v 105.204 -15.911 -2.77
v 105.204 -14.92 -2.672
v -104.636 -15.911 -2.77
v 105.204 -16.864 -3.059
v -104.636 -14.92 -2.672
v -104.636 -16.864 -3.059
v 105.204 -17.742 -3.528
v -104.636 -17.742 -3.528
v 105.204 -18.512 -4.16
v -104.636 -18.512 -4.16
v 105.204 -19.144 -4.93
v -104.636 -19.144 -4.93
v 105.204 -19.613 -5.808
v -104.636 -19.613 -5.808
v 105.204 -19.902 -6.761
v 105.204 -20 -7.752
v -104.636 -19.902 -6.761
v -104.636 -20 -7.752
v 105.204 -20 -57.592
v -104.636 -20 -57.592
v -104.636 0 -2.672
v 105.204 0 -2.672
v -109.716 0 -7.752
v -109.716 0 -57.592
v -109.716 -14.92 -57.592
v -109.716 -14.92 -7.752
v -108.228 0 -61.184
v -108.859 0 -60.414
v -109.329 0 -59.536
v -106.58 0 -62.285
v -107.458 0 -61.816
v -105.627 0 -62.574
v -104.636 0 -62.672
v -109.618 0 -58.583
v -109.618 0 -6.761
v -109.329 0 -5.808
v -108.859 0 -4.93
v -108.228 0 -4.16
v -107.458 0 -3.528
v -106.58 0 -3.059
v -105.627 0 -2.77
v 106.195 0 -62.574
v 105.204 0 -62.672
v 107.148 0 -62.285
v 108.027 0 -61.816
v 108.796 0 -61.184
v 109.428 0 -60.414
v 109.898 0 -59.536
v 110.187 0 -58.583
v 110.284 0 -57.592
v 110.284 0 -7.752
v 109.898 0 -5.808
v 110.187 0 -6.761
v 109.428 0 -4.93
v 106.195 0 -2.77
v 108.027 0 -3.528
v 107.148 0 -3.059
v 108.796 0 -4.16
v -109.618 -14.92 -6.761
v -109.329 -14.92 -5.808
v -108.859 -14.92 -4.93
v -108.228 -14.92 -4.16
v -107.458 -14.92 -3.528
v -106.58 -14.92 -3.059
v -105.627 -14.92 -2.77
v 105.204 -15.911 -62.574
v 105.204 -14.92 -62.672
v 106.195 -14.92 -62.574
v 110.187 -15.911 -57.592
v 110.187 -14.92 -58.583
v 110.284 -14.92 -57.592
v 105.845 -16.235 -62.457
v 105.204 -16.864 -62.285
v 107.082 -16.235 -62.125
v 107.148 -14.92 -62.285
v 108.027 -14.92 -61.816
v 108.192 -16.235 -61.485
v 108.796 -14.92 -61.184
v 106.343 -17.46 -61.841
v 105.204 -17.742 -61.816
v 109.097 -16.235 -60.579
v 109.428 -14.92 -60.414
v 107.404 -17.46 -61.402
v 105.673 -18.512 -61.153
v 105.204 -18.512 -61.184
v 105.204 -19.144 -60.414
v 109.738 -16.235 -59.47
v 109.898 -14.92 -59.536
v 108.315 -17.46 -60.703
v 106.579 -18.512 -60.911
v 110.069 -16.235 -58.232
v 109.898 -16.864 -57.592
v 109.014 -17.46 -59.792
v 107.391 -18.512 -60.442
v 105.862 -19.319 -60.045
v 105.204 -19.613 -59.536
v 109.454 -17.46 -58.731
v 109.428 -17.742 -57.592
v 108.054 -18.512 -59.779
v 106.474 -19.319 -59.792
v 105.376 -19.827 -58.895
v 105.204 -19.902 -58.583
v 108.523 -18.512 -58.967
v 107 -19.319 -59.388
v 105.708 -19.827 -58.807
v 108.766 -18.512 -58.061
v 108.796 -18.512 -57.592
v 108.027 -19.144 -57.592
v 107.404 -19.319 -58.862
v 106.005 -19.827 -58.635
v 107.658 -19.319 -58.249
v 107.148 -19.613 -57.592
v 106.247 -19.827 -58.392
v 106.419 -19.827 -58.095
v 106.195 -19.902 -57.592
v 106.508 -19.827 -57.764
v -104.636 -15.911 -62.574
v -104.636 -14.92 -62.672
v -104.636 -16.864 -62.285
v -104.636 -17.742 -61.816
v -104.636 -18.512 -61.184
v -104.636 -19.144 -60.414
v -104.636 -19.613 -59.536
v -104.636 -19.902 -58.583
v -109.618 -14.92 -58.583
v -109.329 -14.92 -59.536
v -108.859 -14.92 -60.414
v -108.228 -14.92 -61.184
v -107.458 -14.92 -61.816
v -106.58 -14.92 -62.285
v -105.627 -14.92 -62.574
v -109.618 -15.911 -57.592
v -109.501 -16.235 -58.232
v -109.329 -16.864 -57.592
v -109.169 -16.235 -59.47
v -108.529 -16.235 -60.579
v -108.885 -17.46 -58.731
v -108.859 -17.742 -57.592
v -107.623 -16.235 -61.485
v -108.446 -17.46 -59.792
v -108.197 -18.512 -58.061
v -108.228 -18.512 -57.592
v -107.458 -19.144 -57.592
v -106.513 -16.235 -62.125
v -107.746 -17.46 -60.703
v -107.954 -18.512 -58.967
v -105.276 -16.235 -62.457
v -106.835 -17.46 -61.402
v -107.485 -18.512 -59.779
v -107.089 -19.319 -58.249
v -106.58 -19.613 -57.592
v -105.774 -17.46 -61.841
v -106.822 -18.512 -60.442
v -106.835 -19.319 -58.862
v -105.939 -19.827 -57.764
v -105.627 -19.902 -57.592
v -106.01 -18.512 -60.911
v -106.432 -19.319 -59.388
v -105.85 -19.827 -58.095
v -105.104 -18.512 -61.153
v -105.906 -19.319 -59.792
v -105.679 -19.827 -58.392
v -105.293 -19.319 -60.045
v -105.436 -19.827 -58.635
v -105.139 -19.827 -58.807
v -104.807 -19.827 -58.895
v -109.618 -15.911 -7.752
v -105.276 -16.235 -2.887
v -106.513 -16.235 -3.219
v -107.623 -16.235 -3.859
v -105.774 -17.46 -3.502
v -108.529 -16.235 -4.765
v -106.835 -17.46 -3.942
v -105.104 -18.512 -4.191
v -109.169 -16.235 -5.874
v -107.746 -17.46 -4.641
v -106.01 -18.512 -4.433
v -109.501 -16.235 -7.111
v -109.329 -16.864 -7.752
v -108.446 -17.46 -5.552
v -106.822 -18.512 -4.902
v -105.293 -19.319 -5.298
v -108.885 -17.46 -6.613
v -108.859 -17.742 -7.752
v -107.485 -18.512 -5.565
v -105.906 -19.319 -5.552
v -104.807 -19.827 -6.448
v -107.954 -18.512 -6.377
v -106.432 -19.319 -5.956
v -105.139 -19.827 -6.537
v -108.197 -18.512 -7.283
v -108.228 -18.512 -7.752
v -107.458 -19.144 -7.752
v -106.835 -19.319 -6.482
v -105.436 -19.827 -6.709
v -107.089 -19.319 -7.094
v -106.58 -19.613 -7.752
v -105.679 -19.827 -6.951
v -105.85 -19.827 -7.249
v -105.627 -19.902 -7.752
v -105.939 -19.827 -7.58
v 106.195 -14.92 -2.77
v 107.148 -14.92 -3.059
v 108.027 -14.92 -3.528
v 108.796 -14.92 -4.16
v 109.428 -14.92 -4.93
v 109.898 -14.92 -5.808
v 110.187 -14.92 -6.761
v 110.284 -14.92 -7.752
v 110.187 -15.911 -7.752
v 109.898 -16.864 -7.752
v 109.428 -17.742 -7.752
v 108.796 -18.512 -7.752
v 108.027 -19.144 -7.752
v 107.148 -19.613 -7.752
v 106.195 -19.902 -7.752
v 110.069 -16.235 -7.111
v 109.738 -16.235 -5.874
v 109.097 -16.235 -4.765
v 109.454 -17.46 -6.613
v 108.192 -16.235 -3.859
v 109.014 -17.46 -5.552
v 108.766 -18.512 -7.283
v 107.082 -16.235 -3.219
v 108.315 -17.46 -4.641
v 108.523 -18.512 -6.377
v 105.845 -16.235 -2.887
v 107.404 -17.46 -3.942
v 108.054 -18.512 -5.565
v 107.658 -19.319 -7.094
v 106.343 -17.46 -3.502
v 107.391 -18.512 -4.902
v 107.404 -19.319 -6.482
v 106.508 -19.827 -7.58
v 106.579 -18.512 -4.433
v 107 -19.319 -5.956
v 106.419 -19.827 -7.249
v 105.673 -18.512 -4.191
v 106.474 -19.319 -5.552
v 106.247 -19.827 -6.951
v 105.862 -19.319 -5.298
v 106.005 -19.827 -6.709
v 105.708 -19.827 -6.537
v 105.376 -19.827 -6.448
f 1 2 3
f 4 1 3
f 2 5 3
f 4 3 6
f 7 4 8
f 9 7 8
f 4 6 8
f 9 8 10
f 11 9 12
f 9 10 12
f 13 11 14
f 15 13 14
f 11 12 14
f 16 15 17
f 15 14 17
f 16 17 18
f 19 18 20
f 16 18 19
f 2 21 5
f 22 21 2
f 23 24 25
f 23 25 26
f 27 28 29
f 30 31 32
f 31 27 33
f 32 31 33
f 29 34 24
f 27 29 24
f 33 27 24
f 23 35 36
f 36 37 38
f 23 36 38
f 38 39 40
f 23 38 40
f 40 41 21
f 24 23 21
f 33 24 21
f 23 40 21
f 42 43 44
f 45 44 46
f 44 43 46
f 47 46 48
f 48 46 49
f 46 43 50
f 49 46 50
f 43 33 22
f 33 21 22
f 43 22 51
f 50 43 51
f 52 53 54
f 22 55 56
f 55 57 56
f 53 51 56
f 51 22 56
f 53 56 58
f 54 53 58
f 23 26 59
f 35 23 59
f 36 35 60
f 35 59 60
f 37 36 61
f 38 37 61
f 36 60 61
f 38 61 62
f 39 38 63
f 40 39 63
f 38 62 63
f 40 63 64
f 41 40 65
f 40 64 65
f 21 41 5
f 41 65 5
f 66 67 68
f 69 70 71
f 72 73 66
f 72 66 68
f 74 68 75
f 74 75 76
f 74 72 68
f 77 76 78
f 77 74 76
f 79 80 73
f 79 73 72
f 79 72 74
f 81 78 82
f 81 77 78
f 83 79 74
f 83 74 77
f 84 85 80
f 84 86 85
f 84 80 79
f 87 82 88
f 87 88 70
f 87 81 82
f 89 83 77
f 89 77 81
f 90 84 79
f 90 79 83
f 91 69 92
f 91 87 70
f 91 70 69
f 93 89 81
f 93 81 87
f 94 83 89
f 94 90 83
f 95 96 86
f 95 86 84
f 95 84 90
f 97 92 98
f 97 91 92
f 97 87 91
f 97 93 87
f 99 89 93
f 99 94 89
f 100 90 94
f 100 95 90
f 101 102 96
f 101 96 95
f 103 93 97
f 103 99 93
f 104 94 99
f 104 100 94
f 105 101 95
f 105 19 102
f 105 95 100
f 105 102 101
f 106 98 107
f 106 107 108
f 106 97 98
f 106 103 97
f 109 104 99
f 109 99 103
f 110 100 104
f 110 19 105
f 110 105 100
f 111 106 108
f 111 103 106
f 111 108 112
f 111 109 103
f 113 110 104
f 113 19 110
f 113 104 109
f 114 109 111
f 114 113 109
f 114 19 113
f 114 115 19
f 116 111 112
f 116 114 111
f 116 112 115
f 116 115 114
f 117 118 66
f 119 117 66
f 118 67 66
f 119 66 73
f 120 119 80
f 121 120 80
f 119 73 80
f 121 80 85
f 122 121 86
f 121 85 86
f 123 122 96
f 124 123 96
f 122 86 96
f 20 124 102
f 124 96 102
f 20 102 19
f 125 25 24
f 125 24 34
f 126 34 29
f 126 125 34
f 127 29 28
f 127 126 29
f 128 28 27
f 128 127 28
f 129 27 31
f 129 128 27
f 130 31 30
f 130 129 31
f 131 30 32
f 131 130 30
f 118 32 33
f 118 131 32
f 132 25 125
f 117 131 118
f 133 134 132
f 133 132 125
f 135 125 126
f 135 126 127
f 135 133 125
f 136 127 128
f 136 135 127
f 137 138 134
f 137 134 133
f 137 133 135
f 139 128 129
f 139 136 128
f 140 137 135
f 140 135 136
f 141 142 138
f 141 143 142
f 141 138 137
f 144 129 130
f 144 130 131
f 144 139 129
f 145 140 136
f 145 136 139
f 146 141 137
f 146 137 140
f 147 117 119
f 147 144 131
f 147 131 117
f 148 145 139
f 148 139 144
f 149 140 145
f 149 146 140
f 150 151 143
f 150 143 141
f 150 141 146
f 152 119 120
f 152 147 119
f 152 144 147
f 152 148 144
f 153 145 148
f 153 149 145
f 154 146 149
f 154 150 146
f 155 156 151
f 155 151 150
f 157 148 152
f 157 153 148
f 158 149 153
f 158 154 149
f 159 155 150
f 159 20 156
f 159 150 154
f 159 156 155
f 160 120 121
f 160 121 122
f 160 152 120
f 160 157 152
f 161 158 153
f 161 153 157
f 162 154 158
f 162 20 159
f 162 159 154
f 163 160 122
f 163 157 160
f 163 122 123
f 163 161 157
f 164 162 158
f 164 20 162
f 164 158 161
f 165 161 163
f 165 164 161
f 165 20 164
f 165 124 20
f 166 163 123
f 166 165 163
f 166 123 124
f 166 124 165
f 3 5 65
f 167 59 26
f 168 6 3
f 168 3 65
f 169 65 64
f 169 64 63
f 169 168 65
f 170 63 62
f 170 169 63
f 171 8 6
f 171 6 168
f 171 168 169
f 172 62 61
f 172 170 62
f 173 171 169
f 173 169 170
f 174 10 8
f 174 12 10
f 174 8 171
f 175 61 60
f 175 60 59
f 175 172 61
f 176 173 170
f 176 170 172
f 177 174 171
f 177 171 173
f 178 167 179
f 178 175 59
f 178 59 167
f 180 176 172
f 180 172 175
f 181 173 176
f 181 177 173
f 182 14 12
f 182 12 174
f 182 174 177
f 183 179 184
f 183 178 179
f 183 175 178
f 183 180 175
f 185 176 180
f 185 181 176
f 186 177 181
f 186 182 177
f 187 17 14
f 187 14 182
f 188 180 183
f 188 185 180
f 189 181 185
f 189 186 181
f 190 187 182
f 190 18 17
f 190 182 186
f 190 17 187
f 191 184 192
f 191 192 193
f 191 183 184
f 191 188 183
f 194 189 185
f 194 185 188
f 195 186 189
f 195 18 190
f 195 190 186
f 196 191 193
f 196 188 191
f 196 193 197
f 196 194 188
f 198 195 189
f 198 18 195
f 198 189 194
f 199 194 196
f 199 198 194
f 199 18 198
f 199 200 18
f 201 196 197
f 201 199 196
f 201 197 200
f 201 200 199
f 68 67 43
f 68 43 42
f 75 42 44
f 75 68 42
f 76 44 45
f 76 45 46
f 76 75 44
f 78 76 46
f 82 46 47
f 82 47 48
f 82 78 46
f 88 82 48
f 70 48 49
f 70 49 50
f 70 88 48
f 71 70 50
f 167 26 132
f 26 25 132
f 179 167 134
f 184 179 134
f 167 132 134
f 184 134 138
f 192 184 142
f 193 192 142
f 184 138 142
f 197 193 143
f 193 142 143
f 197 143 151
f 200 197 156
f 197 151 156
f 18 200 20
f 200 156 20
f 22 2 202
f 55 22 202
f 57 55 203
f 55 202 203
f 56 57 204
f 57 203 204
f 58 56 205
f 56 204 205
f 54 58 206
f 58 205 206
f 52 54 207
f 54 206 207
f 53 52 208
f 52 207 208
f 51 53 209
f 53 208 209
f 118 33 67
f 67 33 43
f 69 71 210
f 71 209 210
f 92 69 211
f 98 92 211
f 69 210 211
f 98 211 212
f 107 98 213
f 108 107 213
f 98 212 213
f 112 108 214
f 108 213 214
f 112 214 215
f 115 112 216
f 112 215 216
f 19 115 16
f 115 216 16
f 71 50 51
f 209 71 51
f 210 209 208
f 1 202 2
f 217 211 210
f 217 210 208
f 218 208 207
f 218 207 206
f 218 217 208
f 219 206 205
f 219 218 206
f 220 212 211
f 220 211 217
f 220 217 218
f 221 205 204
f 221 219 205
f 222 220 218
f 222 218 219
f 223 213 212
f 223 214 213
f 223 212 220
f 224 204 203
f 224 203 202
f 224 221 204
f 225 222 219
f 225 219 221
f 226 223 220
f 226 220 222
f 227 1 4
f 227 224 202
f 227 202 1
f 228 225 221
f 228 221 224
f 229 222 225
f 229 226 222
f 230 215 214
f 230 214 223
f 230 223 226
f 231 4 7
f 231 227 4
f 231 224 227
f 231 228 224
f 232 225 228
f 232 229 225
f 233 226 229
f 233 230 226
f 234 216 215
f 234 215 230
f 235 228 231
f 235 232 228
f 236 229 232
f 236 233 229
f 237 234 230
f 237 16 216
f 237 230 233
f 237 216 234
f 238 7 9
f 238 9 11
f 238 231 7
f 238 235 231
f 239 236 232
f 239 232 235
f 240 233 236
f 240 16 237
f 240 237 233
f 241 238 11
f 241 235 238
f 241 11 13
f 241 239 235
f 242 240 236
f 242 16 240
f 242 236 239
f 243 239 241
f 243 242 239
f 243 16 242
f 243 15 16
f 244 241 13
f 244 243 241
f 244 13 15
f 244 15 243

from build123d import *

# Parameters (mm, degrees)
F0_W     = 220
F0_H     = 60
F1_DEPTH = 20
F2_R     = 5.08
F3_R     = 5.08
F4_R     = 5.08
F5_R     = 5.08


with BuildPart() as f1:
    # F0 (on Front) → F1 (new body)
    with BuildSketch(Plane.XZ):
        with Locations((0.284394, -32.671896)):
            Rectangle(F0_W, F0_H)
    extrude(amount=F1_DEPTH)

    # F2
    f2_edges = [f1.edges().sort_by_distance(p)[0] for p in [
        (-109.715606, -10, -62.671896),
    ]]
    fillet(f2_edges, radius=F2_R)

    # F3
    f3_edges = [f1.edges().sort_by_distance(p)[0] for p in [
        (-109.715606, -10, -2.671896),
    ]]
    fillet(f3_edges, radius=F3_R)

    # F4
    f4_edges = [f1.edges().sort_by_distance(p)[0] for p in [
        (110.284394, -10, -2.671896),
        (110.284394, -10, -62.671896),
    ]]
    fillet(f4_edges, radius=F4_R)

    # F5
    f5_edges = [f1.edges().sort_by_distance(p)[0] for p in [
        (0.284394, -20, -62.671896),
    ]]
    fillet(f5_edges, radius=F5_R)


solid = f1.part
